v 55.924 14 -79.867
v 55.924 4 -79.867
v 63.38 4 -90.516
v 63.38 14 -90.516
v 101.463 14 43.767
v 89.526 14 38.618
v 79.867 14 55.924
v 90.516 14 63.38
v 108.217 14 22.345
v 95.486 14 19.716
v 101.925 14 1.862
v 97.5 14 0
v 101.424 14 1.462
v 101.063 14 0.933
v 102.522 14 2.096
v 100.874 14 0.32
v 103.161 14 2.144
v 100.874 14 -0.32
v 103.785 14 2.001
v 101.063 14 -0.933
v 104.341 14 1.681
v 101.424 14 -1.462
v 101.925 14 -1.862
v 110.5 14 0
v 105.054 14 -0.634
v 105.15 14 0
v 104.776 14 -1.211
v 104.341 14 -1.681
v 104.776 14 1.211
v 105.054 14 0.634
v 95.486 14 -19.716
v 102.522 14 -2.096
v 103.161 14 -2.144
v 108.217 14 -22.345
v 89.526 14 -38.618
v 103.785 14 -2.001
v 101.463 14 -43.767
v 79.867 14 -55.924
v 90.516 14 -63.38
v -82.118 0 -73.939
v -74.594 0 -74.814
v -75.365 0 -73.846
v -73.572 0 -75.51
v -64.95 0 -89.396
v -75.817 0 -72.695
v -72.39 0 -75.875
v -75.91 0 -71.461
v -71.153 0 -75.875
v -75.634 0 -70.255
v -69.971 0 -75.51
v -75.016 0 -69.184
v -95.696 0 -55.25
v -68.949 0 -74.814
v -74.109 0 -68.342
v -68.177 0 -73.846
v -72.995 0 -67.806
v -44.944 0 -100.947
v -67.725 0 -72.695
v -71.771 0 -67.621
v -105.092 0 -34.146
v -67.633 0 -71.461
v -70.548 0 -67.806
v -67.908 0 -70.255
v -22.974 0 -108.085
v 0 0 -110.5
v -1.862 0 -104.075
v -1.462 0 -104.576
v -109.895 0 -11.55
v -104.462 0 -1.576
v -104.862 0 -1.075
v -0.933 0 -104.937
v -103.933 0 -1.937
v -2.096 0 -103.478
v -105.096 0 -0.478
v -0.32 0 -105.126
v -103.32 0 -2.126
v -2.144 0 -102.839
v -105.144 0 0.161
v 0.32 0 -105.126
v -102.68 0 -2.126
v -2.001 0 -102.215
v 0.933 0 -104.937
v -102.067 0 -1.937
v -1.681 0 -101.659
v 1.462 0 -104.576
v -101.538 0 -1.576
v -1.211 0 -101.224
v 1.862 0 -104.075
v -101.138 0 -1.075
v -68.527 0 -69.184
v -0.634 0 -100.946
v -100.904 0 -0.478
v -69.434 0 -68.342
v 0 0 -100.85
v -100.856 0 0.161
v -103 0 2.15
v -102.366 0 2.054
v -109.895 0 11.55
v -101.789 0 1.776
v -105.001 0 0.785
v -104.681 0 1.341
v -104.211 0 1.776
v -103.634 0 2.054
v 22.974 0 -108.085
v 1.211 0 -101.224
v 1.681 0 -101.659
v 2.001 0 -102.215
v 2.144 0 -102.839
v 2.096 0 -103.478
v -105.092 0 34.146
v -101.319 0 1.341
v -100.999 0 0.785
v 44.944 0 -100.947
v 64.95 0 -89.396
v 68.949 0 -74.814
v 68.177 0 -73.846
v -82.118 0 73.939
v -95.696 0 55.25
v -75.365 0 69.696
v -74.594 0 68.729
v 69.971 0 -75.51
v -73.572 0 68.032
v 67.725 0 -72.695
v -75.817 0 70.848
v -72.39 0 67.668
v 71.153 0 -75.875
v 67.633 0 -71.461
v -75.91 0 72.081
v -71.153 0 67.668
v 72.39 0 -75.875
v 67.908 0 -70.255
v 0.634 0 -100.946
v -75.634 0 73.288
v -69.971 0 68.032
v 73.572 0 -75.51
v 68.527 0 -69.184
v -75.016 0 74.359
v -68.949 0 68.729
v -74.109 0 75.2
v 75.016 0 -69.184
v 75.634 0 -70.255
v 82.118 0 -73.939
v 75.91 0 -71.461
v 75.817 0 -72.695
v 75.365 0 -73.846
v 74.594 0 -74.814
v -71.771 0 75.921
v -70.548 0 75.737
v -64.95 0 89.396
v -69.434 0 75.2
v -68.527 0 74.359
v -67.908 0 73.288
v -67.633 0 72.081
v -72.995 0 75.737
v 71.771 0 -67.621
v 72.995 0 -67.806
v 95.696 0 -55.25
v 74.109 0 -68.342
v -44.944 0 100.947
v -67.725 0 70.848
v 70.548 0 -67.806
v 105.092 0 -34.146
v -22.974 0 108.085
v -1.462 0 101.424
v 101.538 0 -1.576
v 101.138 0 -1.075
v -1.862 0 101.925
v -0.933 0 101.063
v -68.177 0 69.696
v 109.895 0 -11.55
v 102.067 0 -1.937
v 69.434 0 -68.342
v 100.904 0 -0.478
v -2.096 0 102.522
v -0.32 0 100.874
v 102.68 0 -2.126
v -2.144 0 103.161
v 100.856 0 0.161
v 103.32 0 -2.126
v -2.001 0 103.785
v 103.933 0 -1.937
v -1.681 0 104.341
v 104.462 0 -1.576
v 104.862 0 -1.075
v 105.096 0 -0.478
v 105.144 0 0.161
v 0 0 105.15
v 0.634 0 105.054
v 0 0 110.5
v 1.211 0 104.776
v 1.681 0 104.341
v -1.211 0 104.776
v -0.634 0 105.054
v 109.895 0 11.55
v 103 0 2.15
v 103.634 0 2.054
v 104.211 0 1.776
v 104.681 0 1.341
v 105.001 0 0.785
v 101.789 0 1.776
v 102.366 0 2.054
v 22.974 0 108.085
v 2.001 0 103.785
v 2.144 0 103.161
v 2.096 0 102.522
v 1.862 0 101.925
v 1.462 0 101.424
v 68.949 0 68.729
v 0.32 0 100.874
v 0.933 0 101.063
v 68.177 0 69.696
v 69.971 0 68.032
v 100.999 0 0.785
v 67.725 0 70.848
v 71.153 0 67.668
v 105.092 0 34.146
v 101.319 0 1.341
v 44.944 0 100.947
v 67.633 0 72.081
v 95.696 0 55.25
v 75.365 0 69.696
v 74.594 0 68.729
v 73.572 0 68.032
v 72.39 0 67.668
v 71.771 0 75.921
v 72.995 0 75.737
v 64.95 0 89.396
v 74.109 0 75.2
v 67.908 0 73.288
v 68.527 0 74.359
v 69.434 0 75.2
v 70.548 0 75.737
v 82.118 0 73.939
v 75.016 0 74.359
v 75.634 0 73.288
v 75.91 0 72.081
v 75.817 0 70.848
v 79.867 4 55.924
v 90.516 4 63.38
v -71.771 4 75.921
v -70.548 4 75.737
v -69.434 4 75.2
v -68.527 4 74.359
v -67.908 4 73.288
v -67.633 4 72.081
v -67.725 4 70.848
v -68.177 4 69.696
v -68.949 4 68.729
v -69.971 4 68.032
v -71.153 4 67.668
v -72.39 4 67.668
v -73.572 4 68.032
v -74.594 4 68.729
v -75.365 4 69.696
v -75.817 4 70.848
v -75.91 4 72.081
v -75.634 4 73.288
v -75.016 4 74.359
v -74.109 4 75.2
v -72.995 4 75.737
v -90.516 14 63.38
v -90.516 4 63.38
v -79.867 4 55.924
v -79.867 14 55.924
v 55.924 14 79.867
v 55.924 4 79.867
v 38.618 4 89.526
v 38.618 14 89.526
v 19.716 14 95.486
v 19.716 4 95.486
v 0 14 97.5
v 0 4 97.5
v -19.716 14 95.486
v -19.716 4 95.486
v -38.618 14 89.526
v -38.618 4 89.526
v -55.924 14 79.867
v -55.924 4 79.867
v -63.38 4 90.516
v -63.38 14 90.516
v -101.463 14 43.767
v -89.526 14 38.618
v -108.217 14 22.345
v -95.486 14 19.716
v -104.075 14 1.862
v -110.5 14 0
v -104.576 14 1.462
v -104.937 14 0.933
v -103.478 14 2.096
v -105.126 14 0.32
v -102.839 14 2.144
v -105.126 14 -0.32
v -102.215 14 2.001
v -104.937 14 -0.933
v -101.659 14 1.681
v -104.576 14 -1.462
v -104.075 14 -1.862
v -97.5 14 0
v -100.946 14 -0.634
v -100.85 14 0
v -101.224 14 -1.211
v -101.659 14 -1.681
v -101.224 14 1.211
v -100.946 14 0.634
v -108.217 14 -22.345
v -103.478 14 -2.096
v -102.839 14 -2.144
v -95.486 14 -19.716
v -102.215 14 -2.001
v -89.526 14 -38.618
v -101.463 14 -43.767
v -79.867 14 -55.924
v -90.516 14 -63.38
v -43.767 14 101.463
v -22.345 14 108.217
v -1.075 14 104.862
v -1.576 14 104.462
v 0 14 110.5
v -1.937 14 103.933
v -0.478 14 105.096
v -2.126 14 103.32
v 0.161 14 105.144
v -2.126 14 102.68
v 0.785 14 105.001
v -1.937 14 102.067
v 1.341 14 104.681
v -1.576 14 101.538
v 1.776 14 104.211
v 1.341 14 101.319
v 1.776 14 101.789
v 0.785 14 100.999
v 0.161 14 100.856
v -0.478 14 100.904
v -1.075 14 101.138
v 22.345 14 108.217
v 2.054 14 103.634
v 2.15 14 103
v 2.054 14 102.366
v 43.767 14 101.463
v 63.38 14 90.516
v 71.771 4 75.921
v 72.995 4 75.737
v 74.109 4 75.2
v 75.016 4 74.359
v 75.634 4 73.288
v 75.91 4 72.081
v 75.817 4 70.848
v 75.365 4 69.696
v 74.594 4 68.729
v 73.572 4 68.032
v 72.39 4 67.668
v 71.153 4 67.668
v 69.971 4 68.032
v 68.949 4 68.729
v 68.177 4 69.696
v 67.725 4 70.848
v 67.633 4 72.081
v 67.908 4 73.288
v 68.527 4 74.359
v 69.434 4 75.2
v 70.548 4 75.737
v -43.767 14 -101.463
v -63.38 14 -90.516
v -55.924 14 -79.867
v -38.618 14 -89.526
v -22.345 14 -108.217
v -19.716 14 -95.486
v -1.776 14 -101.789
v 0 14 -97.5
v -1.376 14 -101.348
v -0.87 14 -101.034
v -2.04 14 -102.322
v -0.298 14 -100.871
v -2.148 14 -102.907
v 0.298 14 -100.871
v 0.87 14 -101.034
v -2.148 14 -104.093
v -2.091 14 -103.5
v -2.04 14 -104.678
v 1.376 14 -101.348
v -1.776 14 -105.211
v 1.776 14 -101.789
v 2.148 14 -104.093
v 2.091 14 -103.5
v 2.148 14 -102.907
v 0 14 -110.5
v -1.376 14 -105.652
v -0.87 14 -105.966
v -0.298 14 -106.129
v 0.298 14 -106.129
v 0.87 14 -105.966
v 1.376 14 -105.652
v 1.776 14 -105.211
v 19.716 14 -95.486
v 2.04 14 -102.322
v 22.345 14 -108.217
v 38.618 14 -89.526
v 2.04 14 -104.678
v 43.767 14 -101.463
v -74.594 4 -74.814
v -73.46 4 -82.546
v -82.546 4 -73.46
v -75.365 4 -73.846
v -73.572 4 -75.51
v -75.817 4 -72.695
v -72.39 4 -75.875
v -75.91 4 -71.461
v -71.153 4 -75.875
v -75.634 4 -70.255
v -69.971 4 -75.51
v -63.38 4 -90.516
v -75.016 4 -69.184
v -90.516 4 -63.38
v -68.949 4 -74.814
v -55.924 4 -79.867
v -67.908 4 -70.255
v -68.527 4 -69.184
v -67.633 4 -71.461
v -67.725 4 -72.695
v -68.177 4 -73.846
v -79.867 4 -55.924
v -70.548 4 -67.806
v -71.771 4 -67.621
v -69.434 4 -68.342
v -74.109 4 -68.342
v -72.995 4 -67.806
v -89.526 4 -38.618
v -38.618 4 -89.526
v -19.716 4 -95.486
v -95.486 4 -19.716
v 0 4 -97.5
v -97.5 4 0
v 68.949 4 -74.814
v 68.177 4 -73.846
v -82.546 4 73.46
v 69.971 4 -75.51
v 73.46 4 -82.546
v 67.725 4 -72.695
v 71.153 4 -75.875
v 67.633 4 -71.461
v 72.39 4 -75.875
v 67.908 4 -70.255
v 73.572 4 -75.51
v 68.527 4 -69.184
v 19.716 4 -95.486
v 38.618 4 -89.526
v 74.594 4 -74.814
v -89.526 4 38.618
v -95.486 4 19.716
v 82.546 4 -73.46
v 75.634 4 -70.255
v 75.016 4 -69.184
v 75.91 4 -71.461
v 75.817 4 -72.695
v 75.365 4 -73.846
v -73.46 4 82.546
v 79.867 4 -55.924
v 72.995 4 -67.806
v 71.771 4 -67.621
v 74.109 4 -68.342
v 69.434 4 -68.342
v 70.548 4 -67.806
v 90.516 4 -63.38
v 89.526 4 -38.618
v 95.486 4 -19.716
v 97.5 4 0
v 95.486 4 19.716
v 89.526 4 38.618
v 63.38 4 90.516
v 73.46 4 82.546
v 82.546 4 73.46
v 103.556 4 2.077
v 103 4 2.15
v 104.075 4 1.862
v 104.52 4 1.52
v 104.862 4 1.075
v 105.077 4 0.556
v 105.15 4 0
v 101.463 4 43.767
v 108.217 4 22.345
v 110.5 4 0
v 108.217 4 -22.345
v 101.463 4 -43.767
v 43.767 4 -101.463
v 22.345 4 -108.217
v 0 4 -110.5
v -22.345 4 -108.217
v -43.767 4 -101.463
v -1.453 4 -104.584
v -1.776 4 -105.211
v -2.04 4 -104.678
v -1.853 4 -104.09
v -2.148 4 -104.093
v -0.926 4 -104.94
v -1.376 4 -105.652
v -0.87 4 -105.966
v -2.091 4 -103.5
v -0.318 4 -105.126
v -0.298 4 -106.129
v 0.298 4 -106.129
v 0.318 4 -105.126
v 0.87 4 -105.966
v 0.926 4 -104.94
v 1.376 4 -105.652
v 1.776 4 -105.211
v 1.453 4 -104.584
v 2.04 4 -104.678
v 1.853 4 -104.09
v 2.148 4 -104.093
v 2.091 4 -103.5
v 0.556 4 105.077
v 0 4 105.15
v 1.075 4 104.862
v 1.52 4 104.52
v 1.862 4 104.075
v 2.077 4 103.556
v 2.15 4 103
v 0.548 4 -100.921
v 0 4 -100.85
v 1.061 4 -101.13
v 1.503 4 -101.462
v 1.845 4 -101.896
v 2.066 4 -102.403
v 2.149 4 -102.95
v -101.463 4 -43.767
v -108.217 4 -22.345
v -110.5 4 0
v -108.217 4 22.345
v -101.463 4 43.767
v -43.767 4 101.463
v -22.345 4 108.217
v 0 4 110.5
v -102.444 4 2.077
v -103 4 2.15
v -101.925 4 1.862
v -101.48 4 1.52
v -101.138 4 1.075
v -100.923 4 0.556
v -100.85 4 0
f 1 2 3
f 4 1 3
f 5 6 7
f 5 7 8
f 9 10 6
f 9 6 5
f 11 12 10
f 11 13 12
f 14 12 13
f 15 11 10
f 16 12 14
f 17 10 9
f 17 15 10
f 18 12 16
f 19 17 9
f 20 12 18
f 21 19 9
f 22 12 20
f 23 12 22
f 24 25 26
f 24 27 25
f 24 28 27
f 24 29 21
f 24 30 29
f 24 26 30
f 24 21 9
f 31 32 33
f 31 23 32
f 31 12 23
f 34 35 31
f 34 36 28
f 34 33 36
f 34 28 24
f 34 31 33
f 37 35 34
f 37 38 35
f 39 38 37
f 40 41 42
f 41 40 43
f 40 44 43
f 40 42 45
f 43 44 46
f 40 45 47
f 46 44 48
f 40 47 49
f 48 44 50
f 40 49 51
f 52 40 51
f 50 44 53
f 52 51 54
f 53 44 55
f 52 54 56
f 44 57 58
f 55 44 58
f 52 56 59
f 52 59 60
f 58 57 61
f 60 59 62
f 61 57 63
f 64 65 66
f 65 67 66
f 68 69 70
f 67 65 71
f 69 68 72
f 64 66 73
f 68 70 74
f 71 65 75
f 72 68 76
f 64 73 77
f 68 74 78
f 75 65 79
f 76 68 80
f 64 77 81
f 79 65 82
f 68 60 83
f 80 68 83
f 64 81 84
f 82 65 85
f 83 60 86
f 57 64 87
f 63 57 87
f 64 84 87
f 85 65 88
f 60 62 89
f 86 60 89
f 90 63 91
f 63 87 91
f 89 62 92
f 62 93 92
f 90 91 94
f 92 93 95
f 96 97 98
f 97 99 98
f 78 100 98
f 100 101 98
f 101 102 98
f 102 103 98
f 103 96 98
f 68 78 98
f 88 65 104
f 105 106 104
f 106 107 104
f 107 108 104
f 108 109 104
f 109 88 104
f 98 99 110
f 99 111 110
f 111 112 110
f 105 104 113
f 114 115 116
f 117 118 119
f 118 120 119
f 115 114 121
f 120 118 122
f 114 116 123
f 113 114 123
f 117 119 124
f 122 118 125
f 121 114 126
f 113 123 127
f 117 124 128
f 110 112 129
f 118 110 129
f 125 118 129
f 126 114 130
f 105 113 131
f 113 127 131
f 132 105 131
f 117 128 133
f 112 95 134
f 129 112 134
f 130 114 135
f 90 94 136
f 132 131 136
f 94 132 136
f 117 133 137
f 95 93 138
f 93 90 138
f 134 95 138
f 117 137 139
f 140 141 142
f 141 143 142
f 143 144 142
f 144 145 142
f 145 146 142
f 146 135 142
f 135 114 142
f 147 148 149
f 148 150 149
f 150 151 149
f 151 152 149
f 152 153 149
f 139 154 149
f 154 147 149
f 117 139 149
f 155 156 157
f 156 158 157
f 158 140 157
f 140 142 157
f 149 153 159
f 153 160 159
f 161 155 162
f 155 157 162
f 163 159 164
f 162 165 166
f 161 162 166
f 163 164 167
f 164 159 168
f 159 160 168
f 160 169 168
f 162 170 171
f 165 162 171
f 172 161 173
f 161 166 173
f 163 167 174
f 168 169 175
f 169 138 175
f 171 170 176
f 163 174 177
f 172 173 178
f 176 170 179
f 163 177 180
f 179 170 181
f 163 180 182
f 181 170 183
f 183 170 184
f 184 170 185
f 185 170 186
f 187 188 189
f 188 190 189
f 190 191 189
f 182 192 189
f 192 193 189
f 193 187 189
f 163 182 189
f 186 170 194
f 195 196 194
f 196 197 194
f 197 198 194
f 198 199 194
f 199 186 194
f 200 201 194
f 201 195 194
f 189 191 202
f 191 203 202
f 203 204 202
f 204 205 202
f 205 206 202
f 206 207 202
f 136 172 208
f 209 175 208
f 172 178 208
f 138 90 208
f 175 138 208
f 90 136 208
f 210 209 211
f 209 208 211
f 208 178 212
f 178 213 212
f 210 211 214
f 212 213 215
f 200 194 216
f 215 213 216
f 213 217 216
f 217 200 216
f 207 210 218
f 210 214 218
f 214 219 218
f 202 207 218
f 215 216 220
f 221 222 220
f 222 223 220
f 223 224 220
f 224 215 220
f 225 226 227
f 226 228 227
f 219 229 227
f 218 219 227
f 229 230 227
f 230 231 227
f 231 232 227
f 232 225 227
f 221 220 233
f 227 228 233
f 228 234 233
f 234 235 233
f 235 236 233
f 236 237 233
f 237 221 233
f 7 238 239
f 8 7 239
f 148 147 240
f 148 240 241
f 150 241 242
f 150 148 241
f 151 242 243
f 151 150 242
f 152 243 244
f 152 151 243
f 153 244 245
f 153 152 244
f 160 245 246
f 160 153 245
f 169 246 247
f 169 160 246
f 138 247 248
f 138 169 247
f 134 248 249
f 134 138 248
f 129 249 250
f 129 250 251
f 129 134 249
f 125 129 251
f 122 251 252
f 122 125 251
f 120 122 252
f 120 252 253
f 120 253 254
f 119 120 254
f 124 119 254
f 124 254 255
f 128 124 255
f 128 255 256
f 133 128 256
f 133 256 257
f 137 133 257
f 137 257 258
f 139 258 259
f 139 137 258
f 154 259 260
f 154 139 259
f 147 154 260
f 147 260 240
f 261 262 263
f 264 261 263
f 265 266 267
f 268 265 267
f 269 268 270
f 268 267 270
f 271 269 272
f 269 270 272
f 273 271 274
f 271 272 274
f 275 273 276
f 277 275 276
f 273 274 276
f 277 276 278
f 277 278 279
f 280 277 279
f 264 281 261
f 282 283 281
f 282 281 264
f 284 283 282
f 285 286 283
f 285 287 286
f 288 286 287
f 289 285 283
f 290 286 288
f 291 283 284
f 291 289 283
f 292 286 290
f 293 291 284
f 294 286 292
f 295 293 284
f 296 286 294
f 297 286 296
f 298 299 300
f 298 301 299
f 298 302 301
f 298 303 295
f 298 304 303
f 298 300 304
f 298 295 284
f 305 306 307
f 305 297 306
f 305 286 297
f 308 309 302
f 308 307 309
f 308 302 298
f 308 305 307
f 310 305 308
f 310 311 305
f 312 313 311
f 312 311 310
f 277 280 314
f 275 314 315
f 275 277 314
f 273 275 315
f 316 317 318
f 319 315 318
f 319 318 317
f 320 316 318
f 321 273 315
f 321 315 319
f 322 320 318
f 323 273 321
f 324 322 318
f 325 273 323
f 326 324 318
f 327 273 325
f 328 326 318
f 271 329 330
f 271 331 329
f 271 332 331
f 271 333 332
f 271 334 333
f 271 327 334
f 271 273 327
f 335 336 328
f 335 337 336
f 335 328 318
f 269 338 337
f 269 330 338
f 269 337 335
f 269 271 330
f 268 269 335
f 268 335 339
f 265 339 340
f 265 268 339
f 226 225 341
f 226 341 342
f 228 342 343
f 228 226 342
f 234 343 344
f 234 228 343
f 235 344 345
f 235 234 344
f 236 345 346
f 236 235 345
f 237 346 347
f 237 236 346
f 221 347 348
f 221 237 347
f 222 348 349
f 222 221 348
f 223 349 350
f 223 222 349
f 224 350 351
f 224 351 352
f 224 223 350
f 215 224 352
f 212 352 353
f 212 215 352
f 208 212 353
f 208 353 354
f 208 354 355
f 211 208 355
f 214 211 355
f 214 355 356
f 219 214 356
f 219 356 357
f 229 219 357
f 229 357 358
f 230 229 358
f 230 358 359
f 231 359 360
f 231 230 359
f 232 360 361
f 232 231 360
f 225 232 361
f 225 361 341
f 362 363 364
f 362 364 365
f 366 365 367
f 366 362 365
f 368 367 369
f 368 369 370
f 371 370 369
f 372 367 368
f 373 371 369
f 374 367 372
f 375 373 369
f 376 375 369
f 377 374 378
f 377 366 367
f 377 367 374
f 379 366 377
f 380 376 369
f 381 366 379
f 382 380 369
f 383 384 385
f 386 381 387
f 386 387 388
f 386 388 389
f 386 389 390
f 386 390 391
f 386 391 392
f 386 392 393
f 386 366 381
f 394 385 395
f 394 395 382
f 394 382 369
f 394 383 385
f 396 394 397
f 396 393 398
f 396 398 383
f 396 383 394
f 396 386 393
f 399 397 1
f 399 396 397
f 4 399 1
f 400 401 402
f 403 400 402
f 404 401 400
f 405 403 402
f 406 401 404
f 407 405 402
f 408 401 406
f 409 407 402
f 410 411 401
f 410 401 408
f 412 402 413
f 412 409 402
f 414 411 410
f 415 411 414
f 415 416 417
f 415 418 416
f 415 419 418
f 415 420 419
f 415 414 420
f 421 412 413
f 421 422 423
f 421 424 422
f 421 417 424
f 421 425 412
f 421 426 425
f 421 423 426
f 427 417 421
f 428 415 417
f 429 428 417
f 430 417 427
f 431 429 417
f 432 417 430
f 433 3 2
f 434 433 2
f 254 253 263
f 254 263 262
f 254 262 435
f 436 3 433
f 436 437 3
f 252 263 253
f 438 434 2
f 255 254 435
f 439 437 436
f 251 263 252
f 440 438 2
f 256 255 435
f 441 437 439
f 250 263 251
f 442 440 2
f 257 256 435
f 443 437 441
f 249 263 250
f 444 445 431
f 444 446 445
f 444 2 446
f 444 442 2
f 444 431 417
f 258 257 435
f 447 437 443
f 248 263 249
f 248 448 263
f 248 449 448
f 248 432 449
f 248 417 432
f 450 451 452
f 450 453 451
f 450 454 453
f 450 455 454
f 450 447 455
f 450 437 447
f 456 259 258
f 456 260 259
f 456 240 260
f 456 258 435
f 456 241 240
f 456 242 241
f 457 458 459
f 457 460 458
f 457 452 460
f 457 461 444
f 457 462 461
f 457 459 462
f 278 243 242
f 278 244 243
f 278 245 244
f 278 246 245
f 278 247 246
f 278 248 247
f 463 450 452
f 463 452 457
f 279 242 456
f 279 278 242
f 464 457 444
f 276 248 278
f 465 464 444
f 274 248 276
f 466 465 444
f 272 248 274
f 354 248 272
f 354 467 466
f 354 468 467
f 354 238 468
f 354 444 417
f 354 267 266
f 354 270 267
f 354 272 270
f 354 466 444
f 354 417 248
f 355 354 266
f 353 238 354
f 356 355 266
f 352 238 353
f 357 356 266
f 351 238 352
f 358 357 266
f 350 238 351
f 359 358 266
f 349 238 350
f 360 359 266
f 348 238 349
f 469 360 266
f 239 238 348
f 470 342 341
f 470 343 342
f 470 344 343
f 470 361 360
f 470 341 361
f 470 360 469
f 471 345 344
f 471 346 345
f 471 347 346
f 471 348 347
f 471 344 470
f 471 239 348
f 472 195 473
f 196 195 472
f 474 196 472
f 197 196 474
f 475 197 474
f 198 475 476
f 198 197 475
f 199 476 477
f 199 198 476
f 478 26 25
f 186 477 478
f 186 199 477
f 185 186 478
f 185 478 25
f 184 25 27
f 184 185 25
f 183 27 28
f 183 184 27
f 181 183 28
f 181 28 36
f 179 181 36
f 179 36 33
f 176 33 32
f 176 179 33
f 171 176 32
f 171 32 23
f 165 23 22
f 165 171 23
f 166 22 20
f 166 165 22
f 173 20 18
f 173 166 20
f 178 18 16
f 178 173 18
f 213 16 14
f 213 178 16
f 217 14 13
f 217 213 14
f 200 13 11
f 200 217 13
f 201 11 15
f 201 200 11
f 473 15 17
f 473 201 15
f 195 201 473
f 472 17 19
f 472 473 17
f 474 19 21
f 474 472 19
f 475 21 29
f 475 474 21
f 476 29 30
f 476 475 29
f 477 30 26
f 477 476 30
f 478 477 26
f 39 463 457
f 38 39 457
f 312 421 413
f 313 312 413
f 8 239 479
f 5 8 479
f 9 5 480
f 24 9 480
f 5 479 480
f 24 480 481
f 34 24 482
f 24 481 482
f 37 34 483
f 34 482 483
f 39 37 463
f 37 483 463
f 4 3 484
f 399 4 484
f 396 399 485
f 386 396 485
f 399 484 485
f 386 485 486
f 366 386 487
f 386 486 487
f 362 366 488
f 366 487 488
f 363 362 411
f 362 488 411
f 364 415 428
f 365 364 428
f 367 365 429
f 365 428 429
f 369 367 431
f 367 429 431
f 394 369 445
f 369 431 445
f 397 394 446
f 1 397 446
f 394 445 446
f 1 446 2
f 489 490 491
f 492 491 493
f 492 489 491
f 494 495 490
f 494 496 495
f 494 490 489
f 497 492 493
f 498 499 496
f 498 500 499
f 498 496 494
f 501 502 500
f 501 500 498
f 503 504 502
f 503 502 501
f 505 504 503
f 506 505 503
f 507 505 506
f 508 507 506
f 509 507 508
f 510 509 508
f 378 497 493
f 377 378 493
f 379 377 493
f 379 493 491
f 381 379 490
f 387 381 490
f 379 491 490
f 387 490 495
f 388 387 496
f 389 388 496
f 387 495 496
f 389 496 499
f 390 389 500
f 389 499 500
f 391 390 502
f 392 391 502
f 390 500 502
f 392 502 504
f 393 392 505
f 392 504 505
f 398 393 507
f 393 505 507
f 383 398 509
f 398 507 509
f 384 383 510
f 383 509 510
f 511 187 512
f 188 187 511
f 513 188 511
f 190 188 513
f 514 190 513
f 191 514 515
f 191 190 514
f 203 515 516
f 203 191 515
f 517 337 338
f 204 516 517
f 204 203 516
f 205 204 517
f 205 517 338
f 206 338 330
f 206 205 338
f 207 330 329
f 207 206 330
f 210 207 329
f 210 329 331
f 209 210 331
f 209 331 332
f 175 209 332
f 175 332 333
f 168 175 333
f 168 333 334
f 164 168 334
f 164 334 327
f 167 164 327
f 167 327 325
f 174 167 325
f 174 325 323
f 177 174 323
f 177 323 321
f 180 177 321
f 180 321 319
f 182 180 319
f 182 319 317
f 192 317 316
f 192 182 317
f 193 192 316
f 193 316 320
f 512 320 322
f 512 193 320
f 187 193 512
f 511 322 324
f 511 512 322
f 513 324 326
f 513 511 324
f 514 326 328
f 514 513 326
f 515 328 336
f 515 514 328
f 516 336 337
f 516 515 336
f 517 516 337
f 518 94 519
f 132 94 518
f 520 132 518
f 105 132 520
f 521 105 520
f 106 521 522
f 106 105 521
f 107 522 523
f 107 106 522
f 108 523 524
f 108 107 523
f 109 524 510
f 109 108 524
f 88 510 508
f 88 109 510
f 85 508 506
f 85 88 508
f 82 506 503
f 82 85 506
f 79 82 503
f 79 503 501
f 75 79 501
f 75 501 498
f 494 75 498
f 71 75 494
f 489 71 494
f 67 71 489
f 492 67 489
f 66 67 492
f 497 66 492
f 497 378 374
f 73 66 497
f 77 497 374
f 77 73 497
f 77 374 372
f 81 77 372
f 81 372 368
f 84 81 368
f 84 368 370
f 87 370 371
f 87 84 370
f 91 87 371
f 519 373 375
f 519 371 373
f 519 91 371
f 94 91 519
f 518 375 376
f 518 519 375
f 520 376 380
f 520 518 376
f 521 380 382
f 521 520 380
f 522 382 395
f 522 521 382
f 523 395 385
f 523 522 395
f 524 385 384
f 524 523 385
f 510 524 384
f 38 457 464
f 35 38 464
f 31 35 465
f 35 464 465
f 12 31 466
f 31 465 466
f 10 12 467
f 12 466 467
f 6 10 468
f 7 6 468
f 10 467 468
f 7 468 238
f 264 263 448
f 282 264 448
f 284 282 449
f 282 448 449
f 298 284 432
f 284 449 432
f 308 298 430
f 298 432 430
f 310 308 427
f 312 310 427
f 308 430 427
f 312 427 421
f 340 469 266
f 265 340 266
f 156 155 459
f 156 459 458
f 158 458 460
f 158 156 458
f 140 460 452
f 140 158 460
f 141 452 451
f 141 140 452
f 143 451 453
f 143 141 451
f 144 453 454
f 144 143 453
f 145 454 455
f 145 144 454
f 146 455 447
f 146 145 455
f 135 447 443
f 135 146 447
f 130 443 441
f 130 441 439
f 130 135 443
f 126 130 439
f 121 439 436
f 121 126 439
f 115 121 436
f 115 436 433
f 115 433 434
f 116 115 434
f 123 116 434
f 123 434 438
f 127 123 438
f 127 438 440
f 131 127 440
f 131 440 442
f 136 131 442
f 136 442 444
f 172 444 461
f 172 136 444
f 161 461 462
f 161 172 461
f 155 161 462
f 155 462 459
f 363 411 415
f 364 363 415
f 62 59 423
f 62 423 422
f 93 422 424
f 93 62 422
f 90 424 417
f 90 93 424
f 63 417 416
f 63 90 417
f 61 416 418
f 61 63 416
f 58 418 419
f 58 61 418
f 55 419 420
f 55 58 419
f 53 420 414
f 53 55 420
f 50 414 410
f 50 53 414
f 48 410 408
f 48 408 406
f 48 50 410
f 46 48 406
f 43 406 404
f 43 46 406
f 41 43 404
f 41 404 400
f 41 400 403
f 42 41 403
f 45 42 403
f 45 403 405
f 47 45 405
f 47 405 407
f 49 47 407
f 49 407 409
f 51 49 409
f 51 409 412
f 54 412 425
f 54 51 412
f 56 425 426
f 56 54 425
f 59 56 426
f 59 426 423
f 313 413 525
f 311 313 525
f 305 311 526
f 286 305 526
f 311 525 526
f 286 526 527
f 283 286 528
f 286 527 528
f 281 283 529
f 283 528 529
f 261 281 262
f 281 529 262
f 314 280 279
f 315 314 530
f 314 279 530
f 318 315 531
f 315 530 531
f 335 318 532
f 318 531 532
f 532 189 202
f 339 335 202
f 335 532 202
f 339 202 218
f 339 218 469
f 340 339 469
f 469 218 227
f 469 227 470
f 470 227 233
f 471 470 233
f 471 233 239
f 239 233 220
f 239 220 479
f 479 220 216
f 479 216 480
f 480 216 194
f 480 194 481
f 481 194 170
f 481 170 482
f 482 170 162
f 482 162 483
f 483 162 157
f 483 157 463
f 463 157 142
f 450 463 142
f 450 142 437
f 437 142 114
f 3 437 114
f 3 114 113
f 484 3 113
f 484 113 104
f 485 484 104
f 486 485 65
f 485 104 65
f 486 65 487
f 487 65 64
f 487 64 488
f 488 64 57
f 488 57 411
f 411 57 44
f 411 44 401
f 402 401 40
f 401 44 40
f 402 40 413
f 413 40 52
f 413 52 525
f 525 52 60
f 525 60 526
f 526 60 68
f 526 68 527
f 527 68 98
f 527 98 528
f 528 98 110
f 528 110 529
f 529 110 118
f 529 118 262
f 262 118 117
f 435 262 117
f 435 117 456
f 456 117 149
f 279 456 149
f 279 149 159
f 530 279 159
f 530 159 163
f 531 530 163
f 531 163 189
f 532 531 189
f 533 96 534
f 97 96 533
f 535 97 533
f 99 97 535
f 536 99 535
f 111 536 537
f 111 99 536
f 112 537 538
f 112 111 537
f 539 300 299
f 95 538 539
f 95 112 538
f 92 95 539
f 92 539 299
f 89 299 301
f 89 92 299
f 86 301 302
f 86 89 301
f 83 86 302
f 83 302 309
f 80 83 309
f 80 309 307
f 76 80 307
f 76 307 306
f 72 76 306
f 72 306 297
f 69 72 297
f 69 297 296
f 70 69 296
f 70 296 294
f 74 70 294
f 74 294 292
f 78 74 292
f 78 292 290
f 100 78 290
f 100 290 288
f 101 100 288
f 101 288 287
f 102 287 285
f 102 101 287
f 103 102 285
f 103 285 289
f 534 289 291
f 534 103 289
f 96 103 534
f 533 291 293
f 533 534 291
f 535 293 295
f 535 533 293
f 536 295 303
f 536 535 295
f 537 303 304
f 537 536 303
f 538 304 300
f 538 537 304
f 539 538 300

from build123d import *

# Parameters (mm, degrees)
SCHIZZO1_R                       = 110.5
SCHIZZO1_R_2                     = 2.15
SCHIZZO1_R_3                     = 4.15
ESTRUSIONE_ESTRUSIONE1_DEPTH     = 4
ESTRUSIONE_ESTRUSIONE2_OUTLINE_R = 2.15
ESTRUSIONE_ESTRUSIONE2_DEPTH     = 10


# Read off the part's stored shape, not the designer's step: Estrusione-Estrusione2
with BuildPart() as part:
    # Schizzo1 → Estrusione-Estrusione1 (new body)
    with BuildSketch(Plane(origin=(0, 0, 0), x_dir=(1, 0, 0), z_dir=(0, 1, 0))):
        with Locations(Location((0, 0, 0), (0, 0, 270))):
            Circle(SCHIZZO1_R)
        with Locations(Location((-103, 0, 0), (0, 0, 270))):
            Circle(SCHIZZO1_R_2, mode=Mode.SUBTRACT)
        with Locations(Location((0, 103, 0), (0, 0, 270))):
            Circle(SCHIZZO1_R_2, mode=Mode.SUBTRACT)
        with Locations(Location((103, 0, 0), (0, 0, 270))):
            Circle(SCHIZZO1_R_2, mode=Mode.SUBTRACT)
        with Locations(Location((0, -103, 0), (0, 0, 270))):
            Circle(SCHIZZO1_R_2, mode=Mode.SUBTRACT)
        with Locations(Location((-71.77133829, 71.77133829, 0), (0, 0, 270))):
            Circle(SCHIZZO1_R_3, mode=Mode.SUBTRACT)
        with Locations(Location((71.77133829, 71.77133829, 0), (0, 0, 270))):
            Circle(SCHIZZO1_R_3, mode=Mode.SUBTRACT)
        with Locations(Location((71.77133829, -71.77133829, 0), (0, 0, 270))):
            Circle(SCHIZZO1_R_3, mode=Mode.SUBTRACT)
        with Locations(Location((-71.77133829, -71.77133829, 0), (0, 0, 270))):
            Circle(SCHIZZO1_R_3, mode=Mode.SUBTRACT)
    extrude(amount=ESTRUSIONE_ESTRUSIONE1_DEPTH)

    # Estrusione-Estrusione2 outline → Estrusione-Estrusione2 (add)
    # profile 1 of 4: a face of its own
    with BuildSketch(Plane(origin=(0, 4, 0), x_dir=(1, 0, 0), z_dir=(0, 1, 0))):
        with BuildLine():
            ThreePointArc((90.516300894, -63.380196217), (110.5, 0), (90.516300894, 63.380196217))
            Line((90.516300894, 63.380196217), (79.867324318, 55.923702544))
            ThreePointArc((79.867324318, 55.923702544), (97.5, 0), (79.867324318, -55.923702544))
            Line((79.867324318, -55.923702544), (90.516300894, -63.380196217))
        make_face()
        with Locations((103, 0)):
            Circle(ESTRUSIONE_ESTRUSIONE2_OUTLINE_R, mode=Mode.SUBTRACT)
    # profile 2 of 4: a face of its own
    with BuildSketch(Plane(origin=(0, 4, 0), x_dir=(1, 0, 0), z_dir=(0, 1, 0))):
        with BuildLine():
            Line((55.923702544, 79.867324318), (63.380196217, 90.516300894))
            ThreePointArc((63.380196217, 90.516300894), (0, 110.5), (-63.380196217, 90.516300894))
            Line((-63.380196217, 90.516300894), (-55.923702544, 79.867324318))
            ThreePointArc((-55.923702544, 79.867324318), (0, 97.5), (55.923702544, 79.867324318))
        make_face()
        with BuildLine():
            ThreePointArc((2.091052367, 103.5), (0, 100.85), (-2.091052367, 103.5))
            ThreePointArc((-2.091052367, 103.5), (0, 106.15), (2.091052367, 103.5))
        make_face(mode=Mode.SUBTRACT)
    # profile 3 of 4: a face of its own
    with BuildSketch(Plane(origin=(0, 4, 0), x_dir=(1, 0, 0), z_dir=(0, 1, 0))):
        with BuildLine():
            ThreePointArc((-63.380196217, -90.516300894), (0, -110.5), (63.380196217, -90.516300894))
            Line((63.380196217, -90.516300894), (55.923702544, -79.867324318))
            ThreePointArc((55.923702544, -79.867324318), (0, -97.5), (-55.923702544, -79.867324318))
            Line((-55.923702544, -79.867324318), (-63.380196217, -90.516300894))
        make_face()
        with Locations((0, -103)):
            Circle(ESTRUSIONE_ESTRUSIONE2_OUTLINE_R, mode=Mode.SUBTRACT)
    # profile 4 of 4: a face of its own
    with BuildSketch(Plane(origin=(0, 4, 0), x_dir=(1, 0, 0), z_dir=(0, 1, 0))):
        with BuildLine():
            Line((-79.867324318, 55.923702544), (-90.516300894, 63.380196217))
            ThreePointArc((-90.516300894, 63.380196217), (-110.5, 0), (-90.516300894, -63.380196217))
            Line((-90.516300894, -63.380196217), (-79.867324318, -55.923702544))
            ThreePointArc((-79.867324318, -55.923702544), (-97.5, 0), (-79.867324318, 55.923702544))
        make_face()
        with Locations((-103, 0)):
            Circle(ESTRUSIONE_ESTRUSIONE2_OUTLINE_R, mode=Mode.SUBTRACT)
    extrude(amount=ESTRUSIONE_ESTRUSIONE2_DEPTH)


solid = part.part
